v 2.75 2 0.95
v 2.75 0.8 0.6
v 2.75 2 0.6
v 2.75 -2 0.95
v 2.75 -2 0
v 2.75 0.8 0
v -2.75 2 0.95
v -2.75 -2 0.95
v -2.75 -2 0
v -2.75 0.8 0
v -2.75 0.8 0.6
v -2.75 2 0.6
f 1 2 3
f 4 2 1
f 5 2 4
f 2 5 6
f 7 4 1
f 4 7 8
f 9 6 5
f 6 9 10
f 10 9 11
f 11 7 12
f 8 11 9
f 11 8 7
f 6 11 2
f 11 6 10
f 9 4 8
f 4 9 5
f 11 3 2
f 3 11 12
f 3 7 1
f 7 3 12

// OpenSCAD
// KYOCERA AVX 046844713002846+: 0.3 mm pitch, 13 position, right-angle
// bottom-contact FPC/ZIF connector. Mates the Bosch BMV080 flex.
//
// Perimeter only - the housing block plus the flip-lock actuator as one
// slab each; contacts, latch detail and the FPC itself are not modelled.
// Authored in KiCad 3D model space (Y is the footprint's Y negated, Z is
// height above the board).

$fn = 24;

WIDTH = 5.5;      // B column of the series drawing at 13 positions
DEPTH = 4.0;
HEIGHT = 0.95;    // mated height
ACT_DEPTH = 1.2;  // flip-lock actuator, shown closed

module housing() {
    translate([-WIDTH / 2, -DEPTH / 2, 0])
        cube([WIDTH, DEPTH - ACT_DEPTH, HEIGHT]);
}

module actuator() {
    translate([-WIDTH / 2, DEPTH / 2 - ACT_DEPTH, HEIGHT - 0.35])
        cube([WIDTH, ACT_DEPTH, 0.35]);
}

housing();
actuator();
